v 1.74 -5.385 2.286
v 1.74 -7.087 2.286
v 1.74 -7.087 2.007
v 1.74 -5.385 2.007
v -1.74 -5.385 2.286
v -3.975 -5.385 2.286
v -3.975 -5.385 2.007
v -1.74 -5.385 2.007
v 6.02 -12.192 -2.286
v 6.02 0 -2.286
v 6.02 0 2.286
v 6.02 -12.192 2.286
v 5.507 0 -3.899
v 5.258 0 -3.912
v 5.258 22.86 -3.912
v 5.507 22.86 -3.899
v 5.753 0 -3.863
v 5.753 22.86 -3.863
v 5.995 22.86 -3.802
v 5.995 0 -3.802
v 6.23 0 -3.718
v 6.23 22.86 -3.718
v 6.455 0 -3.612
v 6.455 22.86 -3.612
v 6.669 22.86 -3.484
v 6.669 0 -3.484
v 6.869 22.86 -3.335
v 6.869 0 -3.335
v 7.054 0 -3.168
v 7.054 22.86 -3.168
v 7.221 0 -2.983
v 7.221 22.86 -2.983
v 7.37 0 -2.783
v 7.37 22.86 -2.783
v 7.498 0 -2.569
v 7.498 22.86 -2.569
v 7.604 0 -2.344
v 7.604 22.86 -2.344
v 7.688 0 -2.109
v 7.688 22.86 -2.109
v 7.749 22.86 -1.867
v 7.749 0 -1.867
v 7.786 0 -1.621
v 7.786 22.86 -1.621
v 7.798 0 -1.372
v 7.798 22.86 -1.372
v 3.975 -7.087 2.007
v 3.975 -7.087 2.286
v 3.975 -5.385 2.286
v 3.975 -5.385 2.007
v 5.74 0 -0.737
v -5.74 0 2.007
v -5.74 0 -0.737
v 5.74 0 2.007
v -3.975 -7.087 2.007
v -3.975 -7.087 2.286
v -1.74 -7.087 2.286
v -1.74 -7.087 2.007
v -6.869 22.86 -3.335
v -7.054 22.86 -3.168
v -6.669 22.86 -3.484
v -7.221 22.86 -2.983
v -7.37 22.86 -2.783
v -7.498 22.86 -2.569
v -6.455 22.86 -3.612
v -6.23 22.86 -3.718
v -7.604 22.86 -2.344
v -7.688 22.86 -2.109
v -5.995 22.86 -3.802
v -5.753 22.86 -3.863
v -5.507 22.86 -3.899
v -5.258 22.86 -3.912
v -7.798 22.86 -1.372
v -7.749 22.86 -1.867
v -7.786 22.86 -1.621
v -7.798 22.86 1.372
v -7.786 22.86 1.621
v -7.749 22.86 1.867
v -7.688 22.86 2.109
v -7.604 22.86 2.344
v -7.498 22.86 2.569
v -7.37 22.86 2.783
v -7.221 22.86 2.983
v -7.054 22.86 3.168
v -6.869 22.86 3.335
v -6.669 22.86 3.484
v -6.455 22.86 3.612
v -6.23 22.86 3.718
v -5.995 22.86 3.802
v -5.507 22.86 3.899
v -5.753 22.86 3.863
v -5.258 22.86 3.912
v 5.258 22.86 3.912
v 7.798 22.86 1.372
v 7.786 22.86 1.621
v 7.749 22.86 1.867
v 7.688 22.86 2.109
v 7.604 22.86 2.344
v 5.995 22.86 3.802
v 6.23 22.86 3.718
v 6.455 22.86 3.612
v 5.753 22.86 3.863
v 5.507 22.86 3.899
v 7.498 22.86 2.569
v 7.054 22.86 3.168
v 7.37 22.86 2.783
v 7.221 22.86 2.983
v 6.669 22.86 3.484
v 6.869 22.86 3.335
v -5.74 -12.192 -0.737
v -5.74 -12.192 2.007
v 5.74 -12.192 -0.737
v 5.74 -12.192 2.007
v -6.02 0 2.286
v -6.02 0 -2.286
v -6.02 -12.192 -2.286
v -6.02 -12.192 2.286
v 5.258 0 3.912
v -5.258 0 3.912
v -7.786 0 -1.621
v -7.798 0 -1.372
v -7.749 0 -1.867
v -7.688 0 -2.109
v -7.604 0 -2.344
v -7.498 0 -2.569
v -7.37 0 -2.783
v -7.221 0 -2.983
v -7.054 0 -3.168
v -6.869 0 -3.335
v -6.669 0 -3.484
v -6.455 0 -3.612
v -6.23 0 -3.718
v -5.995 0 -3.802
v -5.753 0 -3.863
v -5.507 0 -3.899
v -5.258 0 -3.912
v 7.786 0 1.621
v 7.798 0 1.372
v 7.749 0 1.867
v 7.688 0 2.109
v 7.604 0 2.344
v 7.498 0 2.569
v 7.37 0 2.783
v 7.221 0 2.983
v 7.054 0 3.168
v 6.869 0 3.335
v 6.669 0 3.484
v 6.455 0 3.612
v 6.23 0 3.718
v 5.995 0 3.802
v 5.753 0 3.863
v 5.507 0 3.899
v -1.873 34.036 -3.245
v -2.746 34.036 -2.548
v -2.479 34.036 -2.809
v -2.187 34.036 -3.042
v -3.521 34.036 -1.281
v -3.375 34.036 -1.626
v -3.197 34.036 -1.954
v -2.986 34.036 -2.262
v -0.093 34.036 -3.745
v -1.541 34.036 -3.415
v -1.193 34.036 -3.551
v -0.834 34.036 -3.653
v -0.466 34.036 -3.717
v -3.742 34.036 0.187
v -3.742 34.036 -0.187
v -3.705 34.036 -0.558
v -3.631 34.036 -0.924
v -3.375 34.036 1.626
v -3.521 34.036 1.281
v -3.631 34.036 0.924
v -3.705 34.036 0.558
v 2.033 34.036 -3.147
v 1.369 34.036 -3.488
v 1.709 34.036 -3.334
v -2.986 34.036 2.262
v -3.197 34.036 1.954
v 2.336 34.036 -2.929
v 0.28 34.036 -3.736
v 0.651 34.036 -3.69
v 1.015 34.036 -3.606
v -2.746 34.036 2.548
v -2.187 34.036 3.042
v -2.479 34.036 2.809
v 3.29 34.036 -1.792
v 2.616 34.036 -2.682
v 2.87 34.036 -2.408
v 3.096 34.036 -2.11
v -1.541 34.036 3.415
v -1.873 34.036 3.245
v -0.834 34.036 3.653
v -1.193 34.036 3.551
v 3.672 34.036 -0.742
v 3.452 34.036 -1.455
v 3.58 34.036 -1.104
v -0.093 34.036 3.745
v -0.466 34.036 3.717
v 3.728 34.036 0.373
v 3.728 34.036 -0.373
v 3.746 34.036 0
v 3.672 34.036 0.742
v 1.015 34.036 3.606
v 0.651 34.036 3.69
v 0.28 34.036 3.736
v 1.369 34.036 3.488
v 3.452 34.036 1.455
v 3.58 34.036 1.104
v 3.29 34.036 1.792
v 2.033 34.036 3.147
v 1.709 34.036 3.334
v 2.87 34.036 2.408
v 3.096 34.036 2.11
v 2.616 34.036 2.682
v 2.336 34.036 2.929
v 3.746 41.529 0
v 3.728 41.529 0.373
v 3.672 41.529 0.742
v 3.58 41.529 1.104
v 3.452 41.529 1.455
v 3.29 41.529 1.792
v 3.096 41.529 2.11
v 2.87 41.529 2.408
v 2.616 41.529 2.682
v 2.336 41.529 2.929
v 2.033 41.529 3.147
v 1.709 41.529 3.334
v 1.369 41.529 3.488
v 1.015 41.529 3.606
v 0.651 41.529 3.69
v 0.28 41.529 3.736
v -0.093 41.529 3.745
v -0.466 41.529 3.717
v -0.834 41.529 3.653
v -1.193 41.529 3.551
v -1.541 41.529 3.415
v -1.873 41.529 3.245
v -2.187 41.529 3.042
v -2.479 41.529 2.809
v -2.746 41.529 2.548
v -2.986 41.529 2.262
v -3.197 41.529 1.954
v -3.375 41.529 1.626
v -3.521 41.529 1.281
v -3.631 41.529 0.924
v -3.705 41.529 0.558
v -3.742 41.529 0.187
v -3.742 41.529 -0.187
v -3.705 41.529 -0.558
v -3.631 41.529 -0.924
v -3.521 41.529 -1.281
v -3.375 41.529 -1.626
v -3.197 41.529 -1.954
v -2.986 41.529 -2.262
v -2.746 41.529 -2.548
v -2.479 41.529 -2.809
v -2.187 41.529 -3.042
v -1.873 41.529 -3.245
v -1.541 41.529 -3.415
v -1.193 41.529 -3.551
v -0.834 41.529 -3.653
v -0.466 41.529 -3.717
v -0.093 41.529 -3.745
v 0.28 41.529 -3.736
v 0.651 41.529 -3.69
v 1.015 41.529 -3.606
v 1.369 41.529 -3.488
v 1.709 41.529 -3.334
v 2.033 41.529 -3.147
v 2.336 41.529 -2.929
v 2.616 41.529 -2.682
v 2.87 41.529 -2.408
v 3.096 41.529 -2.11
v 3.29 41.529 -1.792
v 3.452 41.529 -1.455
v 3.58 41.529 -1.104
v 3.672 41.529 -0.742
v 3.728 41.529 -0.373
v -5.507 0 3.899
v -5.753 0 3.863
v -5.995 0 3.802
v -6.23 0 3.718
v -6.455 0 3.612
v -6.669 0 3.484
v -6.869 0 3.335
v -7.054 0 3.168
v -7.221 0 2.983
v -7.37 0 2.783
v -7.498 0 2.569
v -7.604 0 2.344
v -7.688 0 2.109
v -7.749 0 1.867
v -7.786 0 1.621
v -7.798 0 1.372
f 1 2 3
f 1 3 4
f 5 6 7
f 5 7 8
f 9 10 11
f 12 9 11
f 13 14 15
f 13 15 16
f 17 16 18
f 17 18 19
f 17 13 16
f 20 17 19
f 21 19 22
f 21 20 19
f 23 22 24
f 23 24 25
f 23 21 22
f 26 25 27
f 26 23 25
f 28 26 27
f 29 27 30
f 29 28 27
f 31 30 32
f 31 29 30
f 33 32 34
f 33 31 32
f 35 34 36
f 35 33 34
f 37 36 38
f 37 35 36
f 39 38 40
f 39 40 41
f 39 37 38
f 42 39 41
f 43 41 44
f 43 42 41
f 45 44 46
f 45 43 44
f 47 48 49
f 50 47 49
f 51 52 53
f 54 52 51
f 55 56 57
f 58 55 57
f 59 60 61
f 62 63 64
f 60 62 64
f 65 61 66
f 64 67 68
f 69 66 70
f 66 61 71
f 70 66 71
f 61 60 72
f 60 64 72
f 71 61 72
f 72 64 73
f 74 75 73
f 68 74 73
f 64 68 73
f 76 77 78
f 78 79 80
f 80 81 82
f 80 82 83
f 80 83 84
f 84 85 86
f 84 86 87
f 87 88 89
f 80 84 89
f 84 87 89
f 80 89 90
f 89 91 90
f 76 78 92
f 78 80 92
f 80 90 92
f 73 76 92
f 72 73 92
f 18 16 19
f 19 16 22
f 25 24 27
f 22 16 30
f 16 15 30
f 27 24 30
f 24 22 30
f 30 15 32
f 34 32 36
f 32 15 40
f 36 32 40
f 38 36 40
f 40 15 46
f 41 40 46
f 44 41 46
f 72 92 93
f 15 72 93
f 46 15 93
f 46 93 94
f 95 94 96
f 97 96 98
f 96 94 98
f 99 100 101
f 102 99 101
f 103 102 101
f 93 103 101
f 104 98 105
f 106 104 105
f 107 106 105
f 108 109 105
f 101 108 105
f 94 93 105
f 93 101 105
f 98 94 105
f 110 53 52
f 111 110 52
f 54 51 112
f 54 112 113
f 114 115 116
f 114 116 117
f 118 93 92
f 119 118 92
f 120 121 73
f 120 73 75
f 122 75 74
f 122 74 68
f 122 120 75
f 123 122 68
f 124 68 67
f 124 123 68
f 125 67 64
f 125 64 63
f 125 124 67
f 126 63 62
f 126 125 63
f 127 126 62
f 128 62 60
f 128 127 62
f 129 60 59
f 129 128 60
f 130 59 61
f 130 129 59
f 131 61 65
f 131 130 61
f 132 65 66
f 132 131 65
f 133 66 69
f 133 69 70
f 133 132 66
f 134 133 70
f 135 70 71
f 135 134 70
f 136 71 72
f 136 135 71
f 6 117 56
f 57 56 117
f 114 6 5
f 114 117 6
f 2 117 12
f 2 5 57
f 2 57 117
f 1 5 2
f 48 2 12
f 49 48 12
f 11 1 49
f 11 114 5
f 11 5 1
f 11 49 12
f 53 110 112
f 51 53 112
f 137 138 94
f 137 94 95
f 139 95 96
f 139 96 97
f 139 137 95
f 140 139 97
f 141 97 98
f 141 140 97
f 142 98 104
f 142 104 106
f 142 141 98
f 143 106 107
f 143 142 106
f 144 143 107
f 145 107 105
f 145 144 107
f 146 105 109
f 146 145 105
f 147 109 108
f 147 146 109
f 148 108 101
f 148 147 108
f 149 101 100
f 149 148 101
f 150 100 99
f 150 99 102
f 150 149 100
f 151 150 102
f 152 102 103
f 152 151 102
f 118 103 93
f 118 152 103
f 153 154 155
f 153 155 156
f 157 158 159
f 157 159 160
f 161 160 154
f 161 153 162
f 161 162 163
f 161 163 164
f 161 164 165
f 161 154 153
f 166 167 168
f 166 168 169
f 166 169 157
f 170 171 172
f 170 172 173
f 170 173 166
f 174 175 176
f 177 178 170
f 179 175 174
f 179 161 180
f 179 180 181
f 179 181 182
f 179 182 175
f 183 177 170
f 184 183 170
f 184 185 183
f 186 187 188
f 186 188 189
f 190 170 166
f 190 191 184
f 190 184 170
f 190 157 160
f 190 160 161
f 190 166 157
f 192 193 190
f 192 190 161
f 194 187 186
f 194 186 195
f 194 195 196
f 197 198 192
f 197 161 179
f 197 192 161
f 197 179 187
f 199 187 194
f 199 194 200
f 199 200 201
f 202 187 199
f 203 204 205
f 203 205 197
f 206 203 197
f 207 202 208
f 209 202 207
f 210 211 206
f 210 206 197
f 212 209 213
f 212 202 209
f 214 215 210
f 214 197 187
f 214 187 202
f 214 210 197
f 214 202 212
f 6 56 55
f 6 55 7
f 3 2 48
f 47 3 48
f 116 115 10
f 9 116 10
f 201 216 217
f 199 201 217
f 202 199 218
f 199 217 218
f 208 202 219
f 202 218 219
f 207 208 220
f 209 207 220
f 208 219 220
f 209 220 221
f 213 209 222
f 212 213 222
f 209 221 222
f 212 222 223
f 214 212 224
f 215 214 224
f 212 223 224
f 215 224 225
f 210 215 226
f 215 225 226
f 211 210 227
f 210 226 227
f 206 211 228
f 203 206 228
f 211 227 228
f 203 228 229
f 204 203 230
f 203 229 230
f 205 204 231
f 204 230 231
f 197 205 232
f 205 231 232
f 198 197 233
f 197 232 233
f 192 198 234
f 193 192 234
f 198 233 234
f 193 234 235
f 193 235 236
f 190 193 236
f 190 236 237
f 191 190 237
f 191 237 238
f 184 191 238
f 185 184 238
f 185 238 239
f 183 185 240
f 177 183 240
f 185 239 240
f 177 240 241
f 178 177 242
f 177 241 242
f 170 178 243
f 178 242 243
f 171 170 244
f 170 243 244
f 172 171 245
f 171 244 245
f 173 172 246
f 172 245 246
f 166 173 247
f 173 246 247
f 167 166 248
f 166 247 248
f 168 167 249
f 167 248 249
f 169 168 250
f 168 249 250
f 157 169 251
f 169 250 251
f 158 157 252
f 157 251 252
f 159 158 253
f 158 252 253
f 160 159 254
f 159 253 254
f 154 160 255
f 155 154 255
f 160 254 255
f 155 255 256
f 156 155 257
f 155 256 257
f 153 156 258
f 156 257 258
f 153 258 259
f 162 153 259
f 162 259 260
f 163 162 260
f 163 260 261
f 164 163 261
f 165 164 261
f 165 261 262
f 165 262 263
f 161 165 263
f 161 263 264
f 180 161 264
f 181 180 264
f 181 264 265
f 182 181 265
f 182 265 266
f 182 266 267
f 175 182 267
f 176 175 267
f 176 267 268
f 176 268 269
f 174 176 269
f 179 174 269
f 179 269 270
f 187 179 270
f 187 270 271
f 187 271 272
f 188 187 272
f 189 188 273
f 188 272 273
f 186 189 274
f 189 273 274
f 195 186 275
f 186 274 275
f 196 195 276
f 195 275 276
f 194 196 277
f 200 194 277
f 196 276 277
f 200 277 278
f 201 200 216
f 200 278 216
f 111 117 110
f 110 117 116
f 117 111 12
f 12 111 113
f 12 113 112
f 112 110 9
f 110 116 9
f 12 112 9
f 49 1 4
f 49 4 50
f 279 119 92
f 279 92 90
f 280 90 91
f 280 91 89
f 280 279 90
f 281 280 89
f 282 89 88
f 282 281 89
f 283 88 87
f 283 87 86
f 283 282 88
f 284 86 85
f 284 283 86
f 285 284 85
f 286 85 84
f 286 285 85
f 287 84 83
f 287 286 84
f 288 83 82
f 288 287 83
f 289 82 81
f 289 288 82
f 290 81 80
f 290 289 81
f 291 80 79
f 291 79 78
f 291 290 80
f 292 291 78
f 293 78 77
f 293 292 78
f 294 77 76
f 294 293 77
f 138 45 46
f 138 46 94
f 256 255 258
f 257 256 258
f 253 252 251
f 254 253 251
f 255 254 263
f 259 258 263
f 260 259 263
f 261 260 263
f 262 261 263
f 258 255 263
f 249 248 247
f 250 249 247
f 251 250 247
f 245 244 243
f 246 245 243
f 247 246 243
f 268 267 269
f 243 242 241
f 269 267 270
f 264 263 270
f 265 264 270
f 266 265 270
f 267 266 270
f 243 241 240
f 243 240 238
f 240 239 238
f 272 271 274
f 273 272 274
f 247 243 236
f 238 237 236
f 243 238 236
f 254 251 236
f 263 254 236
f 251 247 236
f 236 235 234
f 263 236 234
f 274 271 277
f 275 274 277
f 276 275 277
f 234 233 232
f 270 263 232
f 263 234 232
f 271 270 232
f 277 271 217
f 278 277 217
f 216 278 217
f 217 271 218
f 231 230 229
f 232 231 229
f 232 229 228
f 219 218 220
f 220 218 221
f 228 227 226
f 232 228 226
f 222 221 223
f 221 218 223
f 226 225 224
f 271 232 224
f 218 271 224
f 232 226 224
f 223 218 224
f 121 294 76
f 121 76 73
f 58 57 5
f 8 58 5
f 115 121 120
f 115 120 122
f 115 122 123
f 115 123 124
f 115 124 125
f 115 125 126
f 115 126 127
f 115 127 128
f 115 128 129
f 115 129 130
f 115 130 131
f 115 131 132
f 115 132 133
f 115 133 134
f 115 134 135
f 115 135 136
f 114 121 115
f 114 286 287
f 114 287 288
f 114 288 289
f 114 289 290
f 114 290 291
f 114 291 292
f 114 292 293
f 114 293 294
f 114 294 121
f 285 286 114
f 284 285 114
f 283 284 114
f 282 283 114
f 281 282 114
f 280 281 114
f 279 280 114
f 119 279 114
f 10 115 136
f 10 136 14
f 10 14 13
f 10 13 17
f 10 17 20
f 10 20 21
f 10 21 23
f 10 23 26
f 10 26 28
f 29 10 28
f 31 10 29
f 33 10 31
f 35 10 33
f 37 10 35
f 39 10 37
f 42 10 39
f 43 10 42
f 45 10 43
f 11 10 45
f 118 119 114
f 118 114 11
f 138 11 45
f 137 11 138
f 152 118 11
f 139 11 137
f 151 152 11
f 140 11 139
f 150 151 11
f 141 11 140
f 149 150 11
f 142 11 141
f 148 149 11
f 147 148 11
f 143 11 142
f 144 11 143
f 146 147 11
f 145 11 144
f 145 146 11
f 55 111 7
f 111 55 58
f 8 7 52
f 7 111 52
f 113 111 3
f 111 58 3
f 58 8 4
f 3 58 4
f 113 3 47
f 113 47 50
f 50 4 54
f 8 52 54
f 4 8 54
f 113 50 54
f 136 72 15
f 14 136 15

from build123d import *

# Parameters (mm, degrees)
F0_W      = 12.0396
F0_H      = 4.572
F1_DEPTH  = 12.192
F2_T      = -0.2794
F4_DEPTH  = 22.86
F5_W      = 11.4808
F5_H      = 12.192
F6_DEPTH  = 1.27
F7_W      = 2.2352
F7_H      = 1.7018
F8_DEPTH  = 0.2794
F10_R     = 3.7465
F11_DEPTH = 7.493


with BuildPart() as f1:
    # F0 (on Front) → F1 (new body)
    with BuildSketch(Plane.XZ):
        Rectangle(F0_W, F0_H)
    extrude(amount=F1_DEPTH)

    # F2
    f2_openings = [f1.faces().sort_by_distance(p)[0] for p in [
        (0, -12.192, 0),
        (0, 0, 0),
    ]]
    offset(amount=F2_T, openings=f2_openings)

    # F3 (on Front) → F4 (join)
    with BuildSketch(Plane.XZ):
        with BuildLine():
            ThreePointArc((7.7978, 1.3716), (7.0538512242, 3.1676512242), (5.2578, 3.9116))
            Line((5.2578, 3.9116), (-5.2578, 3.9116))
            ThreePointArc((-5.2578, 3.9116), (-7.0538512242, 3.1676512242), (-7.7978, 1.3716))
            Line((-7.7978, 1.3716), (-7.7978, -1.3716))
            ThreePointArc((-7.7978, -1.3716), (-7.0538512242, -3.1676512242), (-5.2578, -3.9116))
            Line((-5.2578, -3.9116), (5.2578, -3.9116))
            ThreePointArc((5.2578, -3.9116), (7.0538512242, -3.1676512242), (7.7978, -1.3716))
            Line((7.7978, -1.3716), (7.7978, 1.3716))
        make_face()
    extrude(amount=-F4_DEPTH)

    # F5 (on face) → F6 (join)
    with BuildSketch(Plane.XY.offset(-2.0066)):
        with Locations((0, -6.096)):
            Rectangle(F5_W, F5_H)
    extrude(amount=F6_DEPTH)

    # F7 (on face) → F8 (cut, through all)
    with BuildSketch(Plane.XY.offset(2.286)):
        with Locations((-2.8575, -6.2357)):
            Rectangle(F7_W, F7_H)
        with Locations((2.8575, -6.2357)):
            Rectangle(F7_W, F7_H)
    extrude(amount=-F8_DEPTH, mode=Mode.SUBTRACT)


with BuildPart() as f11:
    # F10 (on offset) → F11 (new body)
    with BuildSketch(Plane.XZ.offset(-41.529)):
        Circle(F10_R)
    extrude(amount=F11_DEPTH)


solid = Compound([f1.part, f11.part])
